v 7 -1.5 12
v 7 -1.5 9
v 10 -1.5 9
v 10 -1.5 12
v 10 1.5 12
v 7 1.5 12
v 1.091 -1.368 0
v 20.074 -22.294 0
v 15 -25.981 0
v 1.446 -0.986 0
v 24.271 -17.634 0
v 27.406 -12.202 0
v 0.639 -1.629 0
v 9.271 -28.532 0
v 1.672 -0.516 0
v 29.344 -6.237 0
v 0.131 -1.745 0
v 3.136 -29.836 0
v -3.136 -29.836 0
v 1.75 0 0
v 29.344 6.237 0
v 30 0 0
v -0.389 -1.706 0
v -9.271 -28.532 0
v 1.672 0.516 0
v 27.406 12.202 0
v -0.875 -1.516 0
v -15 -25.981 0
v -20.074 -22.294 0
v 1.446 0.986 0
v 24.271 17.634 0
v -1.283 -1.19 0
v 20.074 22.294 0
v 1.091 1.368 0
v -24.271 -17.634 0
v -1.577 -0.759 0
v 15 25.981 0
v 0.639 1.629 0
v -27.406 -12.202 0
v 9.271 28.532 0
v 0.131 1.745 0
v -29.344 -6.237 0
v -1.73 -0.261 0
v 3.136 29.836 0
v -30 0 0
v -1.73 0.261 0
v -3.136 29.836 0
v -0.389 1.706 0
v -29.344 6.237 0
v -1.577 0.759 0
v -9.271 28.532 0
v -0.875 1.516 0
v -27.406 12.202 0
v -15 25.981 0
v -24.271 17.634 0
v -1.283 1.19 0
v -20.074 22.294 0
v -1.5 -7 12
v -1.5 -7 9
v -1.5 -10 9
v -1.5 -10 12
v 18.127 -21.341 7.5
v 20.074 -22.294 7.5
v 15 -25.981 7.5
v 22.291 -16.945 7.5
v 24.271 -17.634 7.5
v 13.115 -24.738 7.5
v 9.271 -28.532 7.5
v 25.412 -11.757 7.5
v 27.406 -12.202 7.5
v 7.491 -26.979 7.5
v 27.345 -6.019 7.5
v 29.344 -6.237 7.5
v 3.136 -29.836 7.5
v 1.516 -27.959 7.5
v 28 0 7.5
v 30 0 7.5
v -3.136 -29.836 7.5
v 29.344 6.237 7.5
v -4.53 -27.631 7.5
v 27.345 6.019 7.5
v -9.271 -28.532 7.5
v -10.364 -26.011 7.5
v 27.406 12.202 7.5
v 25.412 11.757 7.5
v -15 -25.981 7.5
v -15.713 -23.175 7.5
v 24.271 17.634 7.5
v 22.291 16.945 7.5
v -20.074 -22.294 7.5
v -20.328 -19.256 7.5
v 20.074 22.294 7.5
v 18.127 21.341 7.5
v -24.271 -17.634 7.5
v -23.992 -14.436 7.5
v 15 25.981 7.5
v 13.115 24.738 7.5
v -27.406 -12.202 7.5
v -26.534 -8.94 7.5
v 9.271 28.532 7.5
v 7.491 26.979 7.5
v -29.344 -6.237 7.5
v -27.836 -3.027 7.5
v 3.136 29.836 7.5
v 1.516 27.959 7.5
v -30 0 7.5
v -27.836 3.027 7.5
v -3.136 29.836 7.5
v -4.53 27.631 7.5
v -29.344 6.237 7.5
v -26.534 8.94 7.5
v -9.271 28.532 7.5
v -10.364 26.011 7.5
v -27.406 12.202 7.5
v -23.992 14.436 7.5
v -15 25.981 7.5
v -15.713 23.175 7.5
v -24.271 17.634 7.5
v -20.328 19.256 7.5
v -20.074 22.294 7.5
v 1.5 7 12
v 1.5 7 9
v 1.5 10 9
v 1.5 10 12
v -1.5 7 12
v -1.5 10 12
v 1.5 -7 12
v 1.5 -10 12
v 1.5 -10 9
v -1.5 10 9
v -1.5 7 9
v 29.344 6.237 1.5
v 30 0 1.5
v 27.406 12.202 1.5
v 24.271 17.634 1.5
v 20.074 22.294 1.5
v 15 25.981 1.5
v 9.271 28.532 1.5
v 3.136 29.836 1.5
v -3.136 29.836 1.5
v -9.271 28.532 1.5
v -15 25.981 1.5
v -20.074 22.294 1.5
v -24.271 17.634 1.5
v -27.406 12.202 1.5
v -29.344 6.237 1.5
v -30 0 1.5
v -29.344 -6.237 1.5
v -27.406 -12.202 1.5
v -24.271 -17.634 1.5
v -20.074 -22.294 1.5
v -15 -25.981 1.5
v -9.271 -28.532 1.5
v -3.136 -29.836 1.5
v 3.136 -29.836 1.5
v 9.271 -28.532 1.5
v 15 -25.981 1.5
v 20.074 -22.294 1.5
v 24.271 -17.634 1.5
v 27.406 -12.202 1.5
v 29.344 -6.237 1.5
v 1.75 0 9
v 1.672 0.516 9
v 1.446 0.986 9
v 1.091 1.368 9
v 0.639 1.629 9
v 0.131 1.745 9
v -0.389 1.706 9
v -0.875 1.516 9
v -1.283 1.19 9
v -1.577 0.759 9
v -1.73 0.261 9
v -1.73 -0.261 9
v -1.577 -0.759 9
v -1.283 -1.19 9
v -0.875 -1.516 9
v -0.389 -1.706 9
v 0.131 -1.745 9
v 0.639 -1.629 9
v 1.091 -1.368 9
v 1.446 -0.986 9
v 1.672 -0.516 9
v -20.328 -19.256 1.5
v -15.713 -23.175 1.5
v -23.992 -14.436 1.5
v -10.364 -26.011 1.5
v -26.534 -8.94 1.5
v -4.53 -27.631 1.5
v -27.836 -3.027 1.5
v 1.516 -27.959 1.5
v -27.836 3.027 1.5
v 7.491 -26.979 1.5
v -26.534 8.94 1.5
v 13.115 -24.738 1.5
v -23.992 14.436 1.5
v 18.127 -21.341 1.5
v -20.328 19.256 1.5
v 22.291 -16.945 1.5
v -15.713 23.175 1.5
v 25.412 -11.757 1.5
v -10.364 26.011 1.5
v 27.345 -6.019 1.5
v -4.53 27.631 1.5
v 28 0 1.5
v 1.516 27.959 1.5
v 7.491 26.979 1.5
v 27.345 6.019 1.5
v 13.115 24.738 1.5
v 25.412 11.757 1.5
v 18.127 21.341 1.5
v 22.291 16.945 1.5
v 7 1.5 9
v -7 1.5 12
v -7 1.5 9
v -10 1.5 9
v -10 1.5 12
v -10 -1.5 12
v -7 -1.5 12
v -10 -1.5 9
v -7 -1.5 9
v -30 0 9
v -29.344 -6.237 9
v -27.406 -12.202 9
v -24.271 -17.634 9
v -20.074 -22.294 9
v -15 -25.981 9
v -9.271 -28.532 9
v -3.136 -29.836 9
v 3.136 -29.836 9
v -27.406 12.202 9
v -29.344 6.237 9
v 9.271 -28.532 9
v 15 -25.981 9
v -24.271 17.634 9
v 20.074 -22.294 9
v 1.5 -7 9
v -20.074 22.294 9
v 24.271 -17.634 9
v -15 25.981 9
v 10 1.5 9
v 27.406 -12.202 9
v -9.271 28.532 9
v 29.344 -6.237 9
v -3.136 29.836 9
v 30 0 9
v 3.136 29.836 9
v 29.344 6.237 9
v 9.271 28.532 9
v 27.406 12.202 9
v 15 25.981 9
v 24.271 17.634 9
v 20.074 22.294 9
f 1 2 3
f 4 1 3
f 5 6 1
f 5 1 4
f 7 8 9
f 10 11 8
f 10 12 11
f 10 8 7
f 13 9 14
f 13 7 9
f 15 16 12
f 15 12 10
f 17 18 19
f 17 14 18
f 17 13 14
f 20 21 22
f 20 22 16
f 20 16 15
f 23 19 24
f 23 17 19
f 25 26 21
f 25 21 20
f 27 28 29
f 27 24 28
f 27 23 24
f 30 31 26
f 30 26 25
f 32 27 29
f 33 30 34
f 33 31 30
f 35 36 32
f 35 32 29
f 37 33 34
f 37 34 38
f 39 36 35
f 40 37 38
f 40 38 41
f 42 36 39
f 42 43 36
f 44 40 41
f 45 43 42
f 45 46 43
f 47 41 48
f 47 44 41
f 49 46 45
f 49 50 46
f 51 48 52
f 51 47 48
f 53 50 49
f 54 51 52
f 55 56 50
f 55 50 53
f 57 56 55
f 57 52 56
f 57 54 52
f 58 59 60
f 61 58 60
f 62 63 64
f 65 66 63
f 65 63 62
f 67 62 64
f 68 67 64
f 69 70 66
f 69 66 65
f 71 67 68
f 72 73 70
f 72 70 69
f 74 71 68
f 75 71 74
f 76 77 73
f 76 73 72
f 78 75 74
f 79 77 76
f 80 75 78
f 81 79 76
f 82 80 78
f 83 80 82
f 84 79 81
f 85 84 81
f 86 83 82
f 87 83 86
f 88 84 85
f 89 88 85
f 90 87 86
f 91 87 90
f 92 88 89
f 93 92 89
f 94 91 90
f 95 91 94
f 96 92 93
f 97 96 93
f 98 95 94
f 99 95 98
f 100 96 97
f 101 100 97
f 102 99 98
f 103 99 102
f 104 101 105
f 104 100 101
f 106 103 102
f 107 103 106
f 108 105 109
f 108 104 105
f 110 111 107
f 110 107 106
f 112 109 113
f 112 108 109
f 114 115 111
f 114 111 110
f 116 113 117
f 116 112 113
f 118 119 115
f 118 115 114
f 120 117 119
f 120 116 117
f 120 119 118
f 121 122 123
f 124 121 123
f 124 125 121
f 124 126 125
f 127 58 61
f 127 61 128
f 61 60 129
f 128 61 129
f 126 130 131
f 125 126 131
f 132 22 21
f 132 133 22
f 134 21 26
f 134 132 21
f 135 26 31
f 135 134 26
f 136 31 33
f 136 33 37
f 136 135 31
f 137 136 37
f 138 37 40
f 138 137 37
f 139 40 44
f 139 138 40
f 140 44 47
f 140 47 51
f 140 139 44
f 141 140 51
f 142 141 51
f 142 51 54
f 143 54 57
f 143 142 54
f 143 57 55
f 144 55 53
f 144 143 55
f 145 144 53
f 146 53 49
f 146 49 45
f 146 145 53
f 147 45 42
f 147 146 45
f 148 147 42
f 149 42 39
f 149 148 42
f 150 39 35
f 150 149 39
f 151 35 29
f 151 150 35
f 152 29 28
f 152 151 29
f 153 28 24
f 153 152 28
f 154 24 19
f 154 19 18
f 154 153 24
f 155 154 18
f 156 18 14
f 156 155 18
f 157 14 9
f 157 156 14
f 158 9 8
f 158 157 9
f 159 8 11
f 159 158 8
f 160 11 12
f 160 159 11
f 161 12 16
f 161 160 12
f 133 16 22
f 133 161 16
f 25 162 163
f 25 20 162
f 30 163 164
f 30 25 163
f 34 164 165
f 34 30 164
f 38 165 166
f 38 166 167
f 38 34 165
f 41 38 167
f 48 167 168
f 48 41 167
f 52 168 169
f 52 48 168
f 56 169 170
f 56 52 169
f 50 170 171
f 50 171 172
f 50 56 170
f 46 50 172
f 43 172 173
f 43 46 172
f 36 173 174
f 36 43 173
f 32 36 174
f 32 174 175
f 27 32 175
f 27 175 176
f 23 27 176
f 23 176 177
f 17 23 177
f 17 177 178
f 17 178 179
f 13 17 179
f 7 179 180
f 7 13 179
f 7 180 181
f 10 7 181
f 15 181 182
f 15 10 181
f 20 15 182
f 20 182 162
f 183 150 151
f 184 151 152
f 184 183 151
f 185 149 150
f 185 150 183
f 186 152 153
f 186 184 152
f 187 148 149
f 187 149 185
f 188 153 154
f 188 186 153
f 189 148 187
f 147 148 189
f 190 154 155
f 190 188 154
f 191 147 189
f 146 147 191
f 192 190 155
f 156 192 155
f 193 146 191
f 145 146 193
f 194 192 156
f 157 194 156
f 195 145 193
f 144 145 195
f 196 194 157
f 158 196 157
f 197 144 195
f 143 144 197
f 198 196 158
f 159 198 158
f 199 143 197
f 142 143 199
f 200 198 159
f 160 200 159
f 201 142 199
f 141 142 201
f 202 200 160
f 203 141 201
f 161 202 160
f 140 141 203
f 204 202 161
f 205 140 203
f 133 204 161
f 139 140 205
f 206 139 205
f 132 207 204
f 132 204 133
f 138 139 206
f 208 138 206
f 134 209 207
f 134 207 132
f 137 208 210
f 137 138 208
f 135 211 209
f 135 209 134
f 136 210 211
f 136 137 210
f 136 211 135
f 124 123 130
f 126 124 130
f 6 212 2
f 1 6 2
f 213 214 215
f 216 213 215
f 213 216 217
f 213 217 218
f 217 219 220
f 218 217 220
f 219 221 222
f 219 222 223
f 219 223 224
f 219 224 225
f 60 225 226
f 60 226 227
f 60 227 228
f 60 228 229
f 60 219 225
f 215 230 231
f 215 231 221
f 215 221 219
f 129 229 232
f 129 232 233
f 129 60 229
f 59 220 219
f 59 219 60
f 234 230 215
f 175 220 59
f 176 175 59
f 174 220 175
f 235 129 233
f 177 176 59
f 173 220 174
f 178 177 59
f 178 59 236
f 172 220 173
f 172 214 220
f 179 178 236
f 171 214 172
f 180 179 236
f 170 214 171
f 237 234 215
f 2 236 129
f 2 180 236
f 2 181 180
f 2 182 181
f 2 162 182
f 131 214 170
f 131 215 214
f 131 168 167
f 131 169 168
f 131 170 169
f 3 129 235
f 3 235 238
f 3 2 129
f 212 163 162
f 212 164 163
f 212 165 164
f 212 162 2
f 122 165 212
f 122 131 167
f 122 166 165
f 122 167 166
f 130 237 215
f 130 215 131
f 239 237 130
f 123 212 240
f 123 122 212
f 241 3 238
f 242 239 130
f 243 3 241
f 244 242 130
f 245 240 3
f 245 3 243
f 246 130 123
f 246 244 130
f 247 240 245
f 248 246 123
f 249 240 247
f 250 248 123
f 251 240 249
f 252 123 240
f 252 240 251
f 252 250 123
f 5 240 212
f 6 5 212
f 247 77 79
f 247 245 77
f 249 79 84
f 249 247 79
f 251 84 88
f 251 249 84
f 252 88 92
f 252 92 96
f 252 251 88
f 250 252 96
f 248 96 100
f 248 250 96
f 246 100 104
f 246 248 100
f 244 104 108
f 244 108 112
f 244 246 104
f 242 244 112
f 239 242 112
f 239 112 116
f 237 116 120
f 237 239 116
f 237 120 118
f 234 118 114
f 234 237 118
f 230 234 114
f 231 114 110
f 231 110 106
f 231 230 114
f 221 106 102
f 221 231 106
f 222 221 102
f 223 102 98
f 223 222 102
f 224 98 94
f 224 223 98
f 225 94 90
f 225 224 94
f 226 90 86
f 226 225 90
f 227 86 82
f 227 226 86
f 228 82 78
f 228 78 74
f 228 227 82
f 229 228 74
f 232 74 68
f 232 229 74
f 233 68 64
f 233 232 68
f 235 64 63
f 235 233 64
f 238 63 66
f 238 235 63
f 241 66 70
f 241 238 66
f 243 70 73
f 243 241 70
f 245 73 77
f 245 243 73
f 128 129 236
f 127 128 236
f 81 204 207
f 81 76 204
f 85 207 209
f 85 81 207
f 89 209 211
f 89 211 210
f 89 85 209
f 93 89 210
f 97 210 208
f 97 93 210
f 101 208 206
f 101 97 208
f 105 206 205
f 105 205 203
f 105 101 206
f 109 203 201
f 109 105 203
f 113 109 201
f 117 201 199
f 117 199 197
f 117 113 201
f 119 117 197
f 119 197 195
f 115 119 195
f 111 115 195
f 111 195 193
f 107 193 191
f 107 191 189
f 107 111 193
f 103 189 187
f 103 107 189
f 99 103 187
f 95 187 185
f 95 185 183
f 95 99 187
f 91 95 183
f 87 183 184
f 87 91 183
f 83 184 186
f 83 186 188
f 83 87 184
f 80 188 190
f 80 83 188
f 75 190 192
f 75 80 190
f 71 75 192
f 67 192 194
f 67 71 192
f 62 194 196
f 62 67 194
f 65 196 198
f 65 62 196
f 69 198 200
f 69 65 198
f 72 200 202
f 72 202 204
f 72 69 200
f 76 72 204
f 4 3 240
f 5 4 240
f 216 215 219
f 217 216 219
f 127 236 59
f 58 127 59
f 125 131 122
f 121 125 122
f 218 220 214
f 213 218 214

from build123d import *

# Parameters (mm, degrees)
F3_DEPTH = 3
F4_DEPTH = 3


with BuildPart() as f1:
    # F0 (on Front) → F1 (revolve)
    with BuildSketch(Plane.XZ):
        Polygon((1.75, 9), (1.75, 0), (27.950706, 0), (30, 0), (30, 1.5), (28, 1.5), (28, 7.5), (30, 7.5), (30, 9), align=None)
    revolve(axis=Axis((0, 0, 5), (0, 0, 1)))

    # F2 (on face) → F3 (join)
    with BuildSketch(Plane.XY.offset(9)):
        Polygon((-1.5, 7), (1.5, 7), (1.5, 10), (0, 10), (-1.5, 10), align=None)
        Polygon((1.5, -7), (-1.5, -7), (-1.5, -10), (0, -10), (1.5, -10), align=None)
        Polygon((-7, -1.5), (-7, 1.5), (-10, 1.5), (-10, 0), (-10, -1.5), align=None)
        Polygon((10, -1.5), (10, 0), (10, 1.5), (7, 1.5), (7, -1.5), align=None)
    extrude(amount=F3_DEPTH)

    # F2 (on face) → F4 (join)
    with BuildSketch(Plane.XY.offset(9)):
        Polygon((-1.5, 7), (1.5, 7), (1.5, 10), (0, 10), (-1.5, 10), align=None)
        Polygon((-7, -1.5), (-7, 1.5), (-10, 1.5), (-10, 0), (-10, -1.5), align=None)
        Polygon((1.5, -7), (-1.5, -7), (-1.5, -10), (0, -10), (1.5, -10), align=None)
        Polygon((10, -1.5), (10, 0), (10, 1.5), (7, 1.5), (7, -1.5), align=None)
    extrude(amount=F4_DEPTH)


solid = f1.part
